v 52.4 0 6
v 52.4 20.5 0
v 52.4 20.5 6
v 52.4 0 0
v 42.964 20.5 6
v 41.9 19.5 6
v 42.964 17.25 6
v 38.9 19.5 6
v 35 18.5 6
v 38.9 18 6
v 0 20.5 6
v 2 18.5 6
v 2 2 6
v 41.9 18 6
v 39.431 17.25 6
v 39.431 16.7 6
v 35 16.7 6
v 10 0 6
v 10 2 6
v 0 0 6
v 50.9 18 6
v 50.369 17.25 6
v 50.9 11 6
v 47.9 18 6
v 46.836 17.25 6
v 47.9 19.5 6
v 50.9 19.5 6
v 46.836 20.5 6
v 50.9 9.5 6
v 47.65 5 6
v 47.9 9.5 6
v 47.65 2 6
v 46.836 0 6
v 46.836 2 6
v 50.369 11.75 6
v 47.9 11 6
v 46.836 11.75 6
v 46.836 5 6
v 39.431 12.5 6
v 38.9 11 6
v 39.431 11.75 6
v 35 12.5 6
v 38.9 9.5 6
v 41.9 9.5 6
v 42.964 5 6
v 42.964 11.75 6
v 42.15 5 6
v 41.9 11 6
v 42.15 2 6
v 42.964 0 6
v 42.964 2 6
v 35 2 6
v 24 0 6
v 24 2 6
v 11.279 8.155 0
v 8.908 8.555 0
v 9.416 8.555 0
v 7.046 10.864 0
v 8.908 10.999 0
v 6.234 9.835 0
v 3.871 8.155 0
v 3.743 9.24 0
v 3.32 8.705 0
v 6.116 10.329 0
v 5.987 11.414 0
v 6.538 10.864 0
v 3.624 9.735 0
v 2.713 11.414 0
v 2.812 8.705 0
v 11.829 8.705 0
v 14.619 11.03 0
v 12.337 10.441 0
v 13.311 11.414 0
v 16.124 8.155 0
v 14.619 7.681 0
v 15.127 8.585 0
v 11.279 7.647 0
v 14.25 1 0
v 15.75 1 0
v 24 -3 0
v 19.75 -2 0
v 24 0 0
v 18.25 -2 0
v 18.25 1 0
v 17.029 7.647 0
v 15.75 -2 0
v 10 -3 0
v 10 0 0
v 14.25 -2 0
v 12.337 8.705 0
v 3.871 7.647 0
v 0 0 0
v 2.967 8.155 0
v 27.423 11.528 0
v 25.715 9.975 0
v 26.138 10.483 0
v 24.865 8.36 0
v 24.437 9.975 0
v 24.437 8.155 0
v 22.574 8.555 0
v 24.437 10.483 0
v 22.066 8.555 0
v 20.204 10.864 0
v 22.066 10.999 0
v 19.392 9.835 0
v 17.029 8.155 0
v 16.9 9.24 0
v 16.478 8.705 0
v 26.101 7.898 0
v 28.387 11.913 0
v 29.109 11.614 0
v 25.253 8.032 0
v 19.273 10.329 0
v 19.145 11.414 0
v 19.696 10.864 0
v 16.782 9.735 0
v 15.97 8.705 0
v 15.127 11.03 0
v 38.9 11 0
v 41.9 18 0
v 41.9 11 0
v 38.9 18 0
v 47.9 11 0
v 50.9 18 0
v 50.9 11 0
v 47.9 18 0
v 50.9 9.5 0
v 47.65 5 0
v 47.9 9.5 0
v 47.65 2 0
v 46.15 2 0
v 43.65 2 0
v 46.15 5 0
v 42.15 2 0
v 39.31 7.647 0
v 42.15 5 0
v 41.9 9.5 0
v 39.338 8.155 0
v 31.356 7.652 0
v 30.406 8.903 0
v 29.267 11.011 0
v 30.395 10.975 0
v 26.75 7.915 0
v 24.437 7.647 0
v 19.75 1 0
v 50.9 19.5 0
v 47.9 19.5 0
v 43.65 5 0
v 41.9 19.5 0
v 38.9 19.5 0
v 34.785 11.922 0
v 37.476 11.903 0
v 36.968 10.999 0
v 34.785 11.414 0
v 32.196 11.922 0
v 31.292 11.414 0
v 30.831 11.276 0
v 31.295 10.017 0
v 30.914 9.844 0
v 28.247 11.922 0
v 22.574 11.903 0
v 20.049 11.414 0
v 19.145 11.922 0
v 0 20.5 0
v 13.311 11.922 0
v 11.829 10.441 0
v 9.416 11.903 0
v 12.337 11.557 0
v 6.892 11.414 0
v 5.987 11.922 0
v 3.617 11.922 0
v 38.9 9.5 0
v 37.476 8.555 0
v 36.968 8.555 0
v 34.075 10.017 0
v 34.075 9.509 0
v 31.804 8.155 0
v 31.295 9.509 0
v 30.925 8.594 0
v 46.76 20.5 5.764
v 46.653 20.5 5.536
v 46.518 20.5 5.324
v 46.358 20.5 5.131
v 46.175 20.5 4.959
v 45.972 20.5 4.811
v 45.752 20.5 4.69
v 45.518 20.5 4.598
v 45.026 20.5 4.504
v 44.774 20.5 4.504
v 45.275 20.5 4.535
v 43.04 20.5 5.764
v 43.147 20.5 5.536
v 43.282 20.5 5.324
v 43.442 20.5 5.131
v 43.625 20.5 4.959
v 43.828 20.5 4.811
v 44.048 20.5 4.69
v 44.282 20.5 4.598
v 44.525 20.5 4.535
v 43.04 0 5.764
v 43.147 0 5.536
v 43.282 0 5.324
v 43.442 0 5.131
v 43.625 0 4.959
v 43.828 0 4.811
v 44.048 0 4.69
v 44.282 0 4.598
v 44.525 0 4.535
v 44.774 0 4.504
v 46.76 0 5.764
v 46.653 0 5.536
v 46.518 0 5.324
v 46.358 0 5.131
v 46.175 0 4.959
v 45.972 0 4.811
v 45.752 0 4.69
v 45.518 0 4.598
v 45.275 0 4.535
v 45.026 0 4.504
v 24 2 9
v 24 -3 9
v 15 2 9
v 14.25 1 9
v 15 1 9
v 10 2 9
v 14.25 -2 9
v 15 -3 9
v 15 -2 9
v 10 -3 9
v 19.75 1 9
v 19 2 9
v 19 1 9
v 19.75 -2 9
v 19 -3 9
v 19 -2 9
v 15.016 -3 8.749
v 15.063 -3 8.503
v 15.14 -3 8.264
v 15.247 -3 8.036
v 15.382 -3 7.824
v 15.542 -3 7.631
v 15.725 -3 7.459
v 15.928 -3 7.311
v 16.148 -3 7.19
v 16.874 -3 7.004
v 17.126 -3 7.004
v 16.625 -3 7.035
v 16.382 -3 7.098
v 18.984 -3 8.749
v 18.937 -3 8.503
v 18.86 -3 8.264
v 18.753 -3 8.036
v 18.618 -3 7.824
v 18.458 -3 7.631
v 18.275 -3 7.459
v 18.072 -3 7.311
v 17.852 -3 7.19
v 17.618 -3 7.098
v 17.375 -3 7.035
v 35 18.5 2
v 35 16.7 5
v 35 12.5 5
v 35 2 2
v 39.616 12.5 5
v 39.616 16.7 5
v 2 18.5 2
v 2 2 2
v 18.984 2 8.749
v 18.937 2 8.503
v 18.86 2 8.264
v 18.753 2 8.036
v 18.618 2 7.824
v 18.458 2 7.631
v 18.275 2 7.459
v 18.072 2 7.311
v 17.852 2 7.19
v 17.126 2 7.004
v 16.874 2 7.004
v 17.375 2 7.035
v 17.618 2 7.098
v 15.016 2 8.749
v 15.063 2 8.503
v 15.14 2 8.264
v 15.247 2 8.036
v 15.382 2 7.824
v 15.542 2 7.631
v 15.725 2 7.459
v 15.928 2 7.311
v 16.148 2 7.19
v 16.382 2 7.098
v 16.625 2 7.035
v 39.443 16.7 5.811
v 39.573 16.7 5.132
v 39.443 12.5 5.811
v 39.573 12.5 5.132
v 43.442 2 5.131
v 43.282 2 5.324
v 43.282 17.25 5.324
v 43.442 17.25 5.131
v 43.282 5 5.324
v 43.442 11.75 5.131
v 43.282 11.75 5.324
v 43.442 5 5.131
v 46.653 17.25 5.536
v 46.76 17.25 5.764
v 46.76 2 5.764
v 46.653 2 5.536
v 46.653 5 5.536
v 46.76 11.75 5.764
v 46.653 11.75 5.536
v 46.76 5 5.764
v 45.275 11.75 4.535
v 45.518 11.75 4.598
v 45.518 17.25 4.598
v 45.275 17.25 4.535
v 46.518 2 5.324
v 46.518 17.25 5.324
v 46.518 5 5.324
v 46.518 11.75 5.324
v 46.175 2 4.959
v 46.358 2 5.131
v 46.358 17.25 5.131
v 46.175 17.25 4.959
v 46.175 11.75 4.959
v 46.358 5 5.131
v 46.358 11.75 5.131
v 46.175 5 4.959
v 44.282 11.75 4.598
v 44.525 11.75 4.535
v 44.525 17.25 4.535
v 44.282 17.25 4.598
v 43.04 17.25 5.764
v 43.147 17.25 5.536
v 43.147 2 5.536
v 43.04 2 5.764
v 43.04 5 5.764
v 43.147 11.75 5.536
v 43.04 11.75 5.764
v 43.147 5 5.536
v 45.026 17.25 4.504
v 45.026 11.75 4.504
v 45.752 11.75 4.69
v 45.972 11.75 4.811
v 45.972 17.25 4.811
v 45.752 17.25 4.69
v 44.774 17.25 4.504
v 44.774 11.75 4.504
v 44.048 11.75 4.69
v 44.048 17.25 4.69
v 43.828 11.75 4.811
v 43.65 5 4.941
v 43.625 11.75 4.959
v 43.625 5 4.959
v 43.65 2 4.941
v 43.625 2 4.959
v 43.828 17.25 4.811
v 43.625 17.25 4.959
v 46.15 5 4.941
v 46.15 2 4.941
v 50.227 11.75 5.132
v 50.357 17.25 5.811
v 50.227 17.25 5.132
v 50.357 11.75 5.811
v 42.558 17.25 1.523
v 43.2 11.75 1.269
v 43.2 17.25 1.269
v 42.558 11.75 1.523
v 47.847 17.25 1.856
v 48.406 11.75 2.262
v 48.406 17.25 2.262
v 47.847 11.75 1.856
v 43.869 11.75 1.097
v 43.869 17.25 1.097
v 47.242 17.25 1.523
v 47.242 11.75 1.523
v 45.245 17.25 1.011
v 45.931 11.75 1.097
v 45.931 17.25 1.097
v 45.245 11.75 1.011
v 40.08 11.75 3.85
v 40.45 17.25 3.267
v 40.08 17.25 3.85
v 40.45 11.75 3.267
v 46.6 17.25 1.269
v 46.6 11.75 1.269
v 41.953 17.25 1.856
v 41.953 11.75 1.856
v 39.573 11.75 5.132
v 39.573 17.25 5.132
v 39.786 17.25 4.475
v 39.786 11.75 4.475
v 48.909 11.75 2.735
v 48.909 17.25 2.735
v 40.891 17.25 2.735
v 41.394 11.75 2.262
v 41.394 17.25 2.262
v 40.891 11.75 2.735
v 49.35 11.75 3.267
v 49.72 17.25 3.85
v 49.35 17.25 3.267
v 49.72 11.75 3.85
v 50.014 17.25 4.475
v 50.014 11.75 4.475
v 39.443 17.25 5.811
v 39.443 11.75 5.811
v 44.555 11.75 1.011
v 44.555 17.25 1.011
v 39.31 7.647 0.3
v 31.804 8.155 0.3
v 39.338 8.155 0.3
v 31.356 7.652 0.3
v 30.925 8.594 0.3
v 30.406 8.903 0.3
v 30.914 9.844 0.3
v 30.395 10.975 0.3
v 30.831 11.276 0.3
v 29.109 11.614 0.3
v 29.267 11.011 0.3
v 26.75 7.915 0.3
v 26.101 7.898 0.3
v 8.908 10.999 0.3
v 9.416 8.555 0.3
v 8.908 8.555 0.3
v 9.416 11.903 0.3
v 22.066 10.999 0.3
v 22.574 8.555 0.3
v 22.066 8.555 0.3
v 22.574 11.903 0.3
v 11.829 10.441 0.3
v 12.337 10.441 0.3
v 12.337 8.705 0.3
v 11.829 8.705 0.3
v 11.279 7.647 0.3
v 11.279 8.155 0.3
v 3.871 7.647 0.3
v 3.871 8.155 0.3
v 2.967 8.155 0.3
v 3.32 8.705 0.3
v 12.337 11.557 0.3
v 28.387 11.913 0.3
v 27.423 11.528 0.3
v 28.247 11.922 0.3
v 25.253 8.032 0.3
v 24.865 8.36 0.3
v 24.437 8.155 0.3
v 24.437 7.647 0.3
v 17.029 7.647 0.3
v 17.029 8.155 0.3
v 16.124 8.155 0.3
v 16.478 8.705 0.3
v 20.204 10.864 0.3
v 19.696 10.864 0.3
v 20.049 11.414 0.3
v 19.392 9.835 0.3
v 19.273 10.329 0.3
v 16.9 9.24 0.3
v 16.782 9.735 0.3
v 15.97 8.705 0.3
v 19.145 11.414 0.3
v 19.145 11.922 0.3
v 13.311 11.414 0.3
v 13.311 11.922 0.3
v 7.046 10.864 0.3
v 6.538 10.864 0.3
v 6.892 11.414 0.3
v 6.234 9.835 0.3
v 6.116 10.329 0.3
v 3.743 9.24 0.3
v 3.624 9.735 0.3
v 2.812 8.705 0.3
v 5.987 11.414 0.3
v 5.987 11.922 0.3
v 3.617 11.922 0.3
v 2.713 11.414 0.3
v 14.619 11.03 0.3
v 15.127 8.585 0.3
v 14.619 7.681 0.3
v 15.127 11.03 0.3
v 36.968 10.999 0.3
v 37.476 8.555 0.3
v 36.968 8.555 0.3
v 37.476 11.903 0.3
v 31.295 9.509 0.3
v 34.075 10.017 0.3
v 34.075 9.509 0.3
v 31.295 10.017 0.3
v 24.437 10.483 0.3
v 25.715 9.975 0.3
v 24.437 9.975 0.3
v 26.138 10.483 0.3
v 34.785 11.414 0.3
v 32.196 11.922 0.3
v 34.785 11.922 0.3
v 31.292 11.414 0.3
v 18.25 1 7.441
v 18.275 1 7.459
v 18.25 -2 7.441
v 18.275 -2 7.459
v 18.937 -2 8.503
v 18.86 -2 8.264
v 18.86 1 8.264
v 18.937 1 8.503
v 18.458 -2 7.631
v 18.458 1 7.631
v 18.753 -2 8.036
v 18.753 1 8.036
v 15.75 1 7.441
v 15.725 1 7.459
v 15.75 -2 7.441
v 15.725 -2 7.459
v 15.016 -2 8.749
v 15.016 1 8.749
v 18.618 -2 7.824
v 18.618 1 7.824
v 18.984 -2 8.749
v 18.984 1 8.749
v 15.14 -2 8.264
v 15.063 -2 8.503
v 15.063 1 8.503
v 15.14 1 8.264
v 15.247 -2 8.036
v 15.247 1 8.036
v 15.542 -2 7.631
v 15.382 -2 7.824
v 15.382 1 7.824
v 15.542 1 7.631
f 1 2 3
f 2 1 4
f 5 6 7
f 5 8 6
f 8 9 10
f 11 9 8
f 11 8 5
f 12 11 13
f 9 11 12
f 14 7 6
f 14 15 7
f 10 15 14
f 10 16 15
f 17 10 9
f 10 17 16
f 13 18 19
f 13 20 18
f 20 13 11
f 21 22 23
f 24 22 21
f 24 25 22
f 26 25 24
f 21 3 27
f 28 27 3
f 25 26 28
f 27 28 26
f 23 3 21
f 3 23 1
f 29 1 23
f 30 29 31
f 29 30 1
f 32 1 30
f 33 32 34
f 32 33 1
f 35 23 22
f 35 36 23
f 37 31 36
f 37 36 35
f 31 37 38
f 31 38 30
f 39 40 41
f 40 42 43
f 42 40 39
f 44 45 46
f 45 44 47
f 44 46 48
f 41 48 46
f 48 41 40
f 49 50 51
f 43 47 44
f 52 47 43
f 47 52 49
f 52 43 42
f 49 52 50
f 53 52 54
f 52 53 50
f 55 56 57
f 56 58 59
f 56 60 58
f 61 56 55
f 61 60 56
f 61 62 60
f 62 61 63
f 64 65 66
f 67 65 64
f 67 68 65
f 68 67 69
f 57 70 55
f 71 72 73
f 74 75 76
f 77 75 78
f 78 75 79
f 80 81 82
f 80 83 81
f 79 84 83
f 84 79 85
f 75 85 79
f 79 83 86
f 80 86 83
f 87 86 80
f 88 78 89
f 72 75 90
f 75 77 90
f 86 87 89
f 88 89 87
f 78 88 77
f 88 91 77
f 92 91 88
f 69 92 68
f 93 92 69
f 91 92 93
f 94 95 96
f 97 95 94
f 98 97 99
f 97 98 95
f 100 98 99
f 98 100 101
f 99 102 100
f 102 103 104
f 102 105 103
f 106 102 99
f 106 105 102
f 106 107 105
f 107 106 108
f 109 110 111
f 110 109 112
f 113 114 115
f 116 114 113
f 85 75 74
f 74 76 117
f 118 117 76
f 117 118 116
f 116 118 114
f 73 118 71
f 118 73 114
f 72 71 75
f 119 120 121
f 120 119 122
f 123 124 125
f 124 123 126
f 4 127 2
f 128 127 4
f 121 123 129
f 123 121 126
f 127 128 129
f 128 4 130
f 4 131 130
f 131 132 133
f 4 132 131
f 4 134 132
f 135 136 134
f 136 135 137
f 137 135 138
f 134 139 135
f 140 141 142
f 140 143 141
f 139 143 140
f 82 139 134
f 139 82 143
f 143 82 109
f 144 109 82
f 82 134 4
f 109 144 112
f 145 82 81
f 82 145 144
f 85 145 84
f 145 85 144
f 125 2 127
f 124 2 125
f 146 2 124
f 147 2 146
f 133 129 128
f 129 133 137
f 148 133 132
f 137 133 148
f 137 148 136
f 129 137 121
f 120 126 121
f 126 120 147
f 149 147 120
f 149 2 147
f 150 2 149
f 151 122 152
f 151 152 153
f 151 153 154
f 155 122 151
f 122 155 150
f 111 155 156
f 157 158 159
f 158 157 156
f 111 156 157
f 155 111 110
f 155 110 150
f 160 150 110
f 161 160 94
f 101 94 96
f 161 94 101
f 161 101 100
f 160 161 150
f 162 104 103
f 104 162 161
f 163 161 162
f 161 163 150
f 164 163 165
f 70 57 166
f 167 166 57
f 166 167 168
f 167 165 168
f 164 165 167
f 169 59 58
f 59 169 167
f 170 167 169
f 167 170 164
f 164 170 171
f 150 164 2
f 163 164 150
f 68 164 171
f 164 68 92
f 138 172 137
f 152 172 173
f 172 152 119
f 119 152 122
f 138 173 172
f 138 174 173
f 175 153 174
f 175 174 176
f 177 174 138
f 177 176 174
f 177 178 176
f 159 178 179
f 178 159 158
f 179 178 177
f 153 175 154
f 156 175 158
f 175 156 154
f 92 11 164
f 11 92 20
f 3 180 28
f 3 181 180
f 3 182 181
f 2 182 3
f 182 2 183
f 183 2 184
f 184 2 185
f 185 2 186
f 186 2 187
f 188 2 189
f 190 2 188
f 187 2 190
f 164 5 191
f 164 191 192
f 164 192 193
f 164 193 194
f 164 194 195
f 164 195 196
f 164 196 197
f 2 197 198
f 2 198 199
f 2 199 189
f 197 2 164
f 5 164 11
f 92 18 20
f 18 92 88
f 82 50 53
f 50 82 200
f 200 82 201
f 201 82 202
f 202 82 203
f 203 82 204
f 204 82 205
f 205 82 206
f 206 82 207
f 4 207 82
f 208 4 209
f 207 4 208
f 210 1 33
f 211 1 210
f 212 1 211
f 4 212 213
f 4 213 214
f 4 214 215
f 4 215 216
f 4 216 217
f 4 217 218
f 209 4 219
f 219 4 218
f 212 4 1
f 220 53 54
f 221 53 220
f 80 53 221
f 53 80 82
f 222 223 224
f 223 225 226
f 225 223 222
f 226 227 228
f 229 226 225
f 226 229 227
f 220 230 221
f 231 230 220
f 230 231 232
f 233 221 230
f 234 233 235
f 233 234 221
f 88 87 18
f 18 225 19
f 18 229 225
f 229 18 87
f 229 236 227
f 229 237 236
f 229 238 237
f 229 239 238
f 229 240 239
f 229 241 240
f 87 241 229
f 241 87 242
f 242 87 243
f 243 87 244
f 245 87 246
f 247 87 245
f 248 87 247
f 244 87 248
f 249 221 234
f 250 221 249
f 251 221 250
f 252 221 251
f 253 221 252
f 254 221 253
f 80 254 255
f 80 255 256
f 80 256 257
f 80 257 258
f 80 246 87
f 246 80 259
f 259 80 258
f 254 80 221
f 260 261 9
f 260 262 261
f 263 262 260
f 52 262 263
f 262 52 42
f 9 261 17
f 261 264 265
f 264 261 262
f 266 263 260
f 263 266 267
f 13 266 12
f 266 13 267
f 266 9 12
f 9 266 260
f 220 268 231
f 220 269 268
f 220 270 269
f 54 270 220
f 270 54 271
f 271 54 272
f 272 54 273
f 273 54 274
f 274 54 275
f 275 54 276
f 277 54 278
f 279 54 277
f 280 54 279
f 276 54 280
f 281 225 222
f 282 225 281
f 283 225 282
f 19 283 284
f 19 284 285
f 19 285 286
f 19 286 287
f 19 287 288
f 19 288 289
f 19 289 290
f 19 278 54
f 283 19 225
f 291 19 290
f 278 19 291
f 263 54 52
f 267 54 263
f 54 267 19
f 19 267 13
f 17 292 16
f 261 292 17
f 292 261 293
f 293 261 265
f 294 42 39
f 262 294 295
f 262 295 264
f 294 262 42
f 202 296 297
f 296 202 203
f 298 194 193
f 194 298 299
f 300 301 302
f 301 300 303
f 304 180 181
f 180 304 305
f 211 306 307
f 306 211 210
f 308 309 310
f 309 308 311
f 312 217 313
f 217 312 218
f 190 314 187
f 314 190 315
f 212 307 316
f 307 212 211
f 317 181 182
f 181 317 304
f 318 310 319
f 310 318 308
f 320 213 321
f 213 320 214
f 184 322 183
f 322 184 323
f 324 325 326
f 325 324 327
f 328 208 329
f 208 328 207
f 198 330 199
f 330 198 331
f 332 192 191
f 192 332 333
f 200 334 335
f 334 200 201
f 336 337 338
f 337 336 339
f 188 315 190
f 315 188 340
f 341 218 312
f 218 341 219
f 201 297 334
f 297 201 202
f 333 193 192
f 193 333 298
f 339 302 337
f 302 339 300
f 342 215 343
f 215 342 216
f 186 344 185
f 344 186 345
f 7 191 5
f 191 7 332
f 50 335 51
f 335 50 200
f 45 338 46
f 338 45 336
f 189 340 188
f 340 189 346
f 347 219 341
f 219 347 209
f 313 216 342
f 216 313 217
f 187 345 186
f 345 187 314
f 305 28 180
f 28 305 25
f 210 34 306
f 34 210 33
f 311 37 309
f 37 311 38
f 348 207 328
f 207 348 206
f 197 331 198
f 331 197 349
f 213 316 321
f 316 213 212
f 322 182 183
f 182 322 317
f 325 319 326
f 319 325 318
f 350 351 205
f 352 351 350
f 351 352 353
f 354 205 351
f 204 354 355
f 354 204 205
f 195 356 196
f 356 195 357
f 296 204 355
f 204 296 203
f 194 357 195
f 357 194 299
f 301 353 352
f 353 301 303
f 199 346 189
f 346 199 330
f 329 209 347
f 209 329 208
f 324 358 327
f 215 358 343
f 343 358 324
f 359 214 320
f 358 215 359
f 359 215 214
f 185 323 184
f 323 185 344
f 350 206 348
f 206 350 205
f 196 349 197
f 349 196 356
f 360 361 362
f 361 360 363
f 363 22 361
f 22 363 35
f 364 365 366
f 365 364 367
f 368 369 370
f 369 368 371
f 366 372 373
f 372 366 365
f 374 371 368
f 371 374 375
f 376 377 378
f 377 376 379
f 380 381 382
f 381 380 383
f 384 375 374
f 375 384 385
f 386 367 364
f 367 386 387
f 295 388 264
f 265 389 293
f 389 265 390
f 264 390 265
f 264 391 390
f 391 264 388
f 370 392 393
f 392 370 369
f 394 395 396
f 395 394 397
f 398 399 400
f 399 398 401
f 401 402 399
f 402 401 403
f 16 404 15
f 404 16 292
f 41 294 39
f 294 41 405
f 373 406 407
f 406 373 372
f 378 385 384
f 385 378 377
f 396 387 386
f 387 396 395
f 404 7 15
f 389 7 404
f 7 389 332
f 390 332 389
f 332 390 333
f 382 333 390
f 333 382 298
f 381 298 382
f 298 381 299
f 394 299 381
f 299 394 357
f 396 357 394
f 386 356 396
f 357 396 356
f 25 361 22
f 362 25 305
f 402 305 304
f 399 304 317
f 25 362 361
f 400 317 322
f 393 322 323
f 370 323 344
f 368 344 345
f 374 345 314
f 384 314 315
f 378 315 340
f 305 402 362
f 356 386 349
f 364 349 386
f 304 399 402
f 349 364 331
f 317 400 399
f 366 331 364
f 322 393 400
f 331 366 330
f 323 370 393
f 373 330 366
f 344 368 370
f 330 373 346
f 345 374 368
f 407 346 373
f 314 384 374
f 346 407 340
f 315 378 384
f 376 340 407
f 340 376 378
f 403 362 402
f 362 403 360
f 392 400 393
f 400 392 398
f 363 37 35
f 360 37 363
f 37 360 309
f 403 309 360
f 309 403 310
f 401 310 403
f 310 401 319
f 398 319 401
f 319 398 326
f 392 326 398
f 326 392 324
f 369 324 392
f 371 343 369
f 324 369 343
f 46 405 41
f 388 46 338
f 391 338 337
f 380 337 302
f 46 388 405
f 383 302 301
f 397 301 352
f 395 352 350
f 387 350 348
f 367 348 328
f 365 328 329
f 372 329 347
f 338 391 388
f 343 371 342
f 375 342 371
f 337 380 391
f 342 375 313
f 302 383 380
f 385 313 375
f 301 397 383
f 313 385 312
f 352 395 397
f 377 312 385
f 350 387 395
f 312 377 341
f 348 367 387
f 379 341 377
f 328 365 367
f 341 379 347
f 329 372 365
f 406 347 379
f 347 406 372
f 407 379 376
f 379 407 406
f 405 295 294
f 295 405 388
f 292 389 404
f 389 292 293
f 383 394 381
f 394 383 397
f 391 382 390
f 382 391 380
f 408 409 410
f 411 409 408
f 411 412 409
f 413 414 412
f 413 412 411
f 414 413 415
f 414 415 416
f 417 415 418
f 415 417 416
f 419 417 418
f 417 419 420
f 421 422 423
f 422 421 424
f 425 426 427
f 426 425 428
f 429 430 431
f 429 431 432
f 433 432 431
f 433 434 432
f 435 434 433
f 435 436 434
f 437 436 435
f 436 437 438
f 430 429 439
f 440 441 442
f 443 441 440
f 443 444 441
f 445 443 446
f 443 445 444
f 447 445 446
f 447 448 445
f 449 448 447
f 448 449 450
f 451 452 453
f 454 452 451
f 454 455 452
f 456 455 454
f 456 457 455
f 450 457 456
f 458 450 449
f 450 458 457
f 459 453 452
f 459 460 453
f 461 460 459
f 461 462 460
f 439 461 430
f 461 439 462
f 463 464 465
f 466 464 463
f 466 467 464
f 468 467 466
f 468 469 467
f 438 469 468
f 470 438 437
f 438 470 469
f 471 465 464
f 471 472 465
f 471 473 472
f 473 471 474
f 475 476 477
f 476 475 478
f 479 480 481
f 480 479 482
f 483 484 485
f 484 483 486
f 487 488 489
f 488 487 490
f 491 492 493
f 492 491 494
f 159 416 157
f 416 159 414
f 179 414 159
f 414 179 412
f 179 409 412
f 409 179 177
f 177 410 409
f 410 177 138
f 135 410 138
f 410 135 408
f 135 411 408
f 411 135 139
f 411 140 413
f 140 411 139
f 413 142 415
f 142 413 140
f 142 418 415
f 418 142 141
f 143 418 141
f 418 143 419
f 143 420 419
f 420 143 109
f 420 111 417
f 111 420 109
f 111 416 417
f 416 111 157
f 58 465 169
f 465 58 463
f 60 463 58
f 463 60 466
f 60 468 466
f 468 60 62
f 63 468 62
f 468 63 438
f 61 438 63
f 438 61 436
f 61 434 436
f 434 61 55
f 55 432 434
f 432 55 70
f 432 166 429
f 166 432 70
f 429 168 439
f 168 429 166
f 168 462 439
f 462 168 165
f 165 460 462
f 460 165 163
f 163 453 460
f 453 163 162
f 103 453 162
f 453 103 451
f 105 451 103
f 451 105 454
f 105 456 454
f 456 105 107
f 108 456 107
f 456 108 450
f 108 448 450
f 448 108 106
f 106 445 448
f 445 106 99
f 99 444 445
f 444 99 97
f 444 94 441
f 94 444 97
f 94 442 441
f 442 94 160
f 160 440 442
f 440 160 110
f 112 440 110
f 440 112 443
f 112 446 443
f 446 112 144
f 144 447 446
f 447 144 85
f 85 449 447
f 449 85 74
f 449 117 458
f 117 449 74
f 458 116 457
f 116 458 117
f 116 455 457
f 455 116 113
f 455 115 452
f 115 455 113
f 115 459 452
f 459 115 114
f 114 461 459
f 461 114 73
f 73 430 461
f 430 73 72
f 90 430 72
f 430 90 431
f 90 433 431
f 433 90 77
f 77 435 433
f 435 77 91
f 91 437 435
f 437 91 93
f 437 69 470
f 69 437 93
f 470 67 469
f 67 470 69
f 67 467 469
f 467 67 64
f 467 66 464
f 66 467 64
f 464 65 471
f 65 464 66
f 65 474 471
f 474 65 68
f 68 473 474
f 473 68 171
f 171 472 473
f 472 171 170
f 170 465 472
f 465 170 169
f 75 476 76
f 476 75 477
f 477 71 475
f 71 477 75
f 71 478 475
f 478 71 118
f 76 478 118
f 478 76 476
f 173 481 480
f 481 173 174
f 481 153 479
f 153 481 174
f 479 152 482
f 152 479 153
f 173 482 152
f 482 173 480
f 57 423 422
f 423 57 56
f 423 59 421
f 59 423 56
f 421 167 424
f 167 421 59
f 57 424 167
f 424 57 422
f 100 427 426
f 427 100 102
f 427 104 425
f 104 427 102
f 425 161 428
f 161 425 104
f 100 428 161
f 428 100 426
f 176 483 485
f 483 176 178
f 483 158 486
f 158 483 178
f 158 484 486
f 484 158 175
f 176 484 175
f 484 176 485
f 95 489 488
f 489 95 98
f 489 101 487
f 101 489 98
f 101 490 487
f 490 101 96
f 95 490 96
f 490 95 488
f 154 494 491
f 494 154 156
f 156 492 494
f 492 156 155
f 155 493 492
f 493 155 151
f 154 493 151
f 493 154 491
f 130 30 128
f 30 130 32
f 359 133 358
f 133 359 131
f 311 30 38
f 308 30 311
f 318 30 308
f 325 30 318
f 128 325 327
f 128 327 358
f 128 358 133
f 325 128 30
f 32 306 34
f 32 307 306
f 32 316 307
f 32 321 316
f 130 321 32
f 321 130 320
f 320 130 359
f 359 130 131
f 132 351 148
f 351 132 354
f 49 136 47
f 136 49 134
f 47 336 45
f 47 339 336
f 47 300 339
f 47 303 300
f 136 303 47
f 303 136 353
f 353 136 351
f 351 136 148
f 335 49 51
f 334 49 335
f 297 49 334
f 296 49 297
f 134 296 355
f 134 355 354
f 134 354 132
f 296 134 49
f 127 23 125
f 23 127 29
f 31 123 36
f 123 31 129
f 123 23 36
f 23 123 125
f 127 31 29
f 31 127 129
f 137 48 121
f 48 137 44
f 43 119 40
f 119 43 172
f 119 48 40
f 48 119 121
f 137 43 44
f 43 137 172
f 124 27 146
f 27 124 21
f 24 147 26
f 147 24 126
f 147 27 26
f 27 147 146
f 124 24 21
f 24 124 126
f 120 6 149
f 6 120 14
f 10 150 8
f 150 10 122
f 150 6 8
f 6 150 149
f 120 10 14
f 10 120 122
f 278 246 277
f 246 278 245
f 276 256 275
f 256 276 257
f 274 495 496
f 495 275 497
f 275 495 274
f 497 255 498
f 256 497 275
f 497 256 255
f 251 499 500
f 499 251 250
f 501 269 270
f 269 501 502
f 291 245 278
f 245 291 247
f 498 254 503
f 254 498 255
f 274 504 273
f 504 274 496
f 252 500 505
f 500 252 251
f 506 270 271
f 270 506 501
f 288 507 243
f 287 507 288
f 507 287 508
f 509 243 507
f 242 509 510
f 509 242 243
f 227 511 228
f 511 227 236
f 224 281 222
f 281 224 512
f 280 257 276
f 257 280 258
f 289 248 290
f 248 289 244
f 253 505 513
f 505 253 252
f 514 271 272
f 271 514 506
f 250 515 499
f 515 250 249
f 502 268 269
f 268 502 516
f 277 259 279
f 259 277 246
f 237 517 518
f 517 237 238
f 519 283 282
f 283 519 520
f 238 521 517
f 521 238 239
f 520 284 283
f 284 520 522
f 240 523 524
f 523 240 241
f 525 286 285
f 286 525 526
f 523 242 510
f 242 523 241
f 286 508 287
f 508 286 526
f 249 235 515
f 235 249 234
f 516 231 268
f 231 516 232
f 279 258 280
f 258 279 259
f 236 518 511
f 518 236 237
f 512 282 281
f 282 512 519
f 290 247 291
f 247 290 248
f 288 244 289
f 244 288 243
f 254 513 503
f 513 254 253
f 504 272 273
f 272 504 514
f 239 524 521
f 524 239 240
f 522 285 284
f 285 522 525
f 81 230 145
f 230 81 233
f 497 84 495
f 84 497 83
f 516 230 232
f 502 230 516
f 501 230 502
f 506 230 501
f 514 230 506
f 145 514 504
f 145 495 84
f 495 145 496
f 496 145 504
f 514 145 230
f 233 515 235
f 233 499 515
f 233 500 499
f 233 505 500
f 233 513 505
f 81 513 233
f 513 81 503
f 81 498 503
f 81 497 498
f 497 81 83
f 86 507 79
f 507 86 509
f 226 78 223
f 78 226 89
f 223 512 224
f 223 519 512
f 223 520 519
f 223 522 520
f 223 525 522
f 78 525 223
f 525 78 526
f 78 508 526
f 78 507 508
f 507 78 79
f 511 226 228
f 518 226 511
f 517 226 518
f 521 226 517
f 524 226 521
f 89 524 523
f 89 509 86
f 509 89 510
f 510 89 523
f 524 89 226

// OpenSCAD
$fn = 50;
// outer measurement of the PCB with everythin except the sensor
inner = [ 33, 16.5, 21 ];

// Border that we want to overlap onto the pcb
overlap_top = 1;
// should be smaller than bottom offset, else it looks retarded
pcb_base_height = 3;

// hight of Wall around the PCB
bottom_offset = 4;
// width of the wall including the bottom
outerwall = 2;

// the adjusted outerwall of the top part (only side walls!)
outerwall_top = outerwall + 1;

// details of the front yard
// outer size of the front yard
// Distance of the sensor bottom to the pcb
sensorlength = 7.5;
// radius of the magnet
magnetradius = 5.5;
//width of the magnet
magnetwidth = 5.5;
// offset of the right edge of the pcb
magnetoffset = 10.5;
// Depth of the sensor within the magnet
magnetsensoradjust = 3.1;
// For positioning the sensort in the middle of the magnet
// be careful to keep this value << outerwall
magnetheightadjust = 1;
// radius of the measured wire
wireradius = 2;
// radius of the cablebinder holes
cablebinder_width = 3;
cablebinder_height = 1.5;

datawireradius = 2;

//cablebinder_frontyard_wirecap_conncetor_offset
cablebindermagnetdistance = 1.5;
cablebinderwiredistance = 2.5;

// Sidemount configuration
sidemount_offx = 17;
sidemount_cable_offsetz = 1;
sidemount_sizex = datawireradius*2 + cablebinder_width*2 + outerwall*2;
sidemount_sizey = cablebinder_width + outerwall;
sidemount_sizez = outerwall + bottom_offset + sidemount_cable_offsetz + datawireradius;

// WIREHOLDER STUFF
wireholdersize = [15, 12, 8];
wireholder_offsetz = 4.0;

// Connecting pin between top and bottom
connectingpindepth = 1;
connectingpinradius = outerwall/2-0.1;

// The cablebinder holder at the front 

front_gapx = 10 + outerwall;
front_gapz = 0;
front_holex = 5;
//////////////////////////////////////////////////////
// Calculation shit
//////////////////////////////////////////////////////
magnet_center  = [
    outerwall + inner[0] + sensorlength + magnetradius - magnetsensoradjust,
    outerwall + magnetoffset - 0.75 + magnetwidth/2,
    outerwall + magnetradius - magnetheightadjust
];

frontyard = [ 
    sensorlength + magnetradius*2 - magnetsensoradjust , 
    inner[1] + outerwall * 2,
    bottom_offset
];

///////////////////////////////////////////////////////
// Module fun
///////////////////////////////////////////////////////

module magnet() {
    translate(magnet_center)
    rotate([-90, 0, 0])
    cylinder(h=magnetwidth, r=magnetradius, center=true);
    
}

module wire() {
    translate([outerwall + inner[0] + sensorlength + magnetradius - magnetsensoradjust,
        outerwall + inner[1]/2,
        outerwall + magnetradius - magnetheightadjust
    ])
    rotate([90, 0, 0]) {
        
        cylinder(h=inner[0]+outerwall*2, r = wireradius, center=true);
        cylinder(h=inner[0]+outerwall*2, r = wireradius, center=true);
    }
}

module datawire() {
    //Hole for the datawire
    translate([sidemount_offx, 
        -sidemount_sizey/2 + outerwall + overlap_top/2,
        sidemount_sizez])
    rotate([90, 0, 0])
    cylinder(r=datawireradius, h=sidemount_sizey + overlap_top, center=true);
}

module platine_bottom() {
    translate([outerwall, outerwall, outerwall]) {
        cube(inner);
    }
}

module platine() {
    // TODO add sensor?
    translate([outerwall, outerwall, outerwall]) {
        cube([inner[0], inner[1], pcb_base_height]);
        translate([ overlap_top, overlap_top, pcb_base_height])
        cube([inner[0] - overlap_top*2,
            inner[1] - overlap_top*2,
            inner[2] - pcb_base_height]);
        
        translate ([inner[0] - overlap_top,
            magnetoffset,
            3.0
        ])
        cube([
            sensorlength + overlap_top,
            4.2,
            2
        ]);
    }
}

module cablebinder_frontyard(adjustx, y) {
    translate([
        magnet_center[0] + adjustx,
        y,
        magnet_center[2] + bottom_offset + outerwall/2
    ])
    cube([cablebinder_height, cablebinder_width, 999],
        center=true);
}

module cablebinder_frontyard_top(adjustx, y) {
    translate([
        magnet_center[0] + adjustx,
        y,
        magnet_center[2] + bottom_offset + outerwall/2
    ])
    cube([cablebinder_width, cablebinder_height, 999],
        center=true);
}


module cablebinder_sidemount(adjustx) {
    translate([
        sidemount_offx + adjustx,
        -sidemount_sizey/2 + outerwall,
        0
    ])
    cube([cablebinder_height, cablebinder_width, 999],
        center=true);
}

module connectingpin(delta) {
    translate([outerwall + inner[0] + connectingpinradius + 0.1,
            outerwall + 1,
            outerwall + bottom_offset - connectingpindepth])
    cylinder(h=connectingpindepth+delta, r=connectingpinradius+delta);

    translate([outerwall + inner[0] + connectingpinradius + 0.1,
            outerwall + inner[1] - 0.5,
            outerwall + bottom_offset - connectingpindepth])
    cylinder(h=connectingpindepth+delta, r=connectingpinradius+delta);

}

module stustanet_logo(height) {
    linear_extrude(height = height, convexity=100)
        import (file = "logo.dxf");
    
}


module sidemount() {
    // sidemount
    translate([sidemount_offx,
        -sidemount_sizey/2 + outerwall + overlap_top/2,
        sidemount_sizez/2])
    cube([sidemount_sizex, sidemount_sizey  + overlap_top, sidemount_sizez], center=true);

}

module bottom() {
    difference () {
        union() {
            // Main body
            cube([
                inner[0] + outerwall * 2 + frontyard[0],
                inner[1] + outerwall * 2,
                bottom_offset + outerwall
            ]);
            sidemount();
        }
        // PCB hole
        platine();
        platine_bottom();
        magnet();
        wire();
        
        
        translate([1.5, 13.5, 0.3])
        scale([0.15, 0.15, 0.15])
        rotate([180, 0, 0])
        stustanet_logo(1/0.15);
        
        cablebinder_frontyard( wireradius, outerwall + cablebinder_width/2);
        cablebinder_frontyard(-wireradius, outerwall + cablebinder_width/2);
        
        cablebinder_frontyard_top( wireradius + cablebinderwiredistance,
            magnet_center[1] - magnetwidth/2 - cablebindermagnetdistance);
        cablebinder_frontyard_top(-wireradius - cablebinderwiredistance,
            magnet_center[1] - magnetwidth/2 - cablebindermagnetdistance);

        cablebinder_frontyard_top( wireradius + cablebinderwiredistance, 
            magnet_center[1] + magnetwidth/2 + cablebindermagnetdistance);
        cablebinder_frontyard_top(-wireradius - cablebinderwiredistance, 
            magnet_center[1] + magnetwidth/2 + cablebindermagnetdistance);
        
        datawire();
        cablebinder_sidemount(datawireradius);
        cablebinder_sidemount(-datawireradius);
    }
}

module wireholder() {
    difference() {
        translate([magnet_center[0], magnet_center[1], magnet_center[2] + wireholder_offsetz])
            cube(wireholdersize, center=true);

        magnet();
        wire();
        platine();

                cablebinder_frontyard_top( wireradius + cablebinderwiredistance,
            magnet_center[1] - magnetwidth/2 - cablebindermagnetdistance);
        cablebinder_frontyard_top(-wireradius - cablebinderwiredistance,
            magnet_center[1] - magnetwidth/2 - cablebindermagnetdistance);

        cablebinder_frontyard_top( wireradius + cablebinderwiredistance, 
            magnet_center[1] + magnetwidth/2 + cablebindermagnetdistance);
        cablebinder_frontyard_top(-wireradius - cablebinderwiredistance, 
            magnet_center[1] + magnetwidth/2 + cablebindermagnetdistance);
    }
}

module top() {
    // TODO: Die Oberedeckfläche ist zu dich - der Kondensator stößt dagegen
    difference() {
        union() {
            difference() {
                union() {
                    translate([0, 0, pcb_base_height + outerwall+0.1])
                    cube([inner[0] + outerwall*2,
                        inner[1] + outerwall*2,
                        inner[2] - pcb_base_height + outerwall]);
                }
                sidemount();
                platine();
                datawire();
                bottom();
                
                #translate([2.4, 1.5, pcb_base_height + outerwall+0.1 + inner[2] - pcb_base_height + outerwall-0.3])
                scale([0.1, 0.1, 0.1])
                rotate([0, 0, 30])
                stustanet_logo(1/0.1);

            }
            translate([outerwall +inner[0] - front_gapx,
                0,
                outerwall + inner[2] - pcb_base_height - front_gapz])
            cube([
                front_gapx + outerwall,
                inner[1] + outerwall*2,
                front_gapz + outerwall + pcb_base_height
            ]);
        }
        translate([outerwall * 2 + inner[0] - front_gapx,
            0,
            outerwall * 2  + inner[2] - pcb_base_height - front_gapz])
        cube([
            front_holex,
            inner[1] + outerwall*2,
            front_gapz + outerwall + bottom_offset
        ]);
    }
    
}

//platine();
//magnet();
//wire();
//connectingpin();
bottom();
//wireholder();
//top();
/*
        translate([outerwall/2, 
            outerwall+datawireradius,
            backplate_height + outerwall + bottom_offset - 4])
        rotate([0, 90, 180])
        hull() {
            cylinder(h=outerwall, r=datawireradius, center=true);
            #translate([0, datawireradius, 0]) {
                cube([datawireradius*2, datawireradius, outerwall+1], center=true);
            }
        }
*/
